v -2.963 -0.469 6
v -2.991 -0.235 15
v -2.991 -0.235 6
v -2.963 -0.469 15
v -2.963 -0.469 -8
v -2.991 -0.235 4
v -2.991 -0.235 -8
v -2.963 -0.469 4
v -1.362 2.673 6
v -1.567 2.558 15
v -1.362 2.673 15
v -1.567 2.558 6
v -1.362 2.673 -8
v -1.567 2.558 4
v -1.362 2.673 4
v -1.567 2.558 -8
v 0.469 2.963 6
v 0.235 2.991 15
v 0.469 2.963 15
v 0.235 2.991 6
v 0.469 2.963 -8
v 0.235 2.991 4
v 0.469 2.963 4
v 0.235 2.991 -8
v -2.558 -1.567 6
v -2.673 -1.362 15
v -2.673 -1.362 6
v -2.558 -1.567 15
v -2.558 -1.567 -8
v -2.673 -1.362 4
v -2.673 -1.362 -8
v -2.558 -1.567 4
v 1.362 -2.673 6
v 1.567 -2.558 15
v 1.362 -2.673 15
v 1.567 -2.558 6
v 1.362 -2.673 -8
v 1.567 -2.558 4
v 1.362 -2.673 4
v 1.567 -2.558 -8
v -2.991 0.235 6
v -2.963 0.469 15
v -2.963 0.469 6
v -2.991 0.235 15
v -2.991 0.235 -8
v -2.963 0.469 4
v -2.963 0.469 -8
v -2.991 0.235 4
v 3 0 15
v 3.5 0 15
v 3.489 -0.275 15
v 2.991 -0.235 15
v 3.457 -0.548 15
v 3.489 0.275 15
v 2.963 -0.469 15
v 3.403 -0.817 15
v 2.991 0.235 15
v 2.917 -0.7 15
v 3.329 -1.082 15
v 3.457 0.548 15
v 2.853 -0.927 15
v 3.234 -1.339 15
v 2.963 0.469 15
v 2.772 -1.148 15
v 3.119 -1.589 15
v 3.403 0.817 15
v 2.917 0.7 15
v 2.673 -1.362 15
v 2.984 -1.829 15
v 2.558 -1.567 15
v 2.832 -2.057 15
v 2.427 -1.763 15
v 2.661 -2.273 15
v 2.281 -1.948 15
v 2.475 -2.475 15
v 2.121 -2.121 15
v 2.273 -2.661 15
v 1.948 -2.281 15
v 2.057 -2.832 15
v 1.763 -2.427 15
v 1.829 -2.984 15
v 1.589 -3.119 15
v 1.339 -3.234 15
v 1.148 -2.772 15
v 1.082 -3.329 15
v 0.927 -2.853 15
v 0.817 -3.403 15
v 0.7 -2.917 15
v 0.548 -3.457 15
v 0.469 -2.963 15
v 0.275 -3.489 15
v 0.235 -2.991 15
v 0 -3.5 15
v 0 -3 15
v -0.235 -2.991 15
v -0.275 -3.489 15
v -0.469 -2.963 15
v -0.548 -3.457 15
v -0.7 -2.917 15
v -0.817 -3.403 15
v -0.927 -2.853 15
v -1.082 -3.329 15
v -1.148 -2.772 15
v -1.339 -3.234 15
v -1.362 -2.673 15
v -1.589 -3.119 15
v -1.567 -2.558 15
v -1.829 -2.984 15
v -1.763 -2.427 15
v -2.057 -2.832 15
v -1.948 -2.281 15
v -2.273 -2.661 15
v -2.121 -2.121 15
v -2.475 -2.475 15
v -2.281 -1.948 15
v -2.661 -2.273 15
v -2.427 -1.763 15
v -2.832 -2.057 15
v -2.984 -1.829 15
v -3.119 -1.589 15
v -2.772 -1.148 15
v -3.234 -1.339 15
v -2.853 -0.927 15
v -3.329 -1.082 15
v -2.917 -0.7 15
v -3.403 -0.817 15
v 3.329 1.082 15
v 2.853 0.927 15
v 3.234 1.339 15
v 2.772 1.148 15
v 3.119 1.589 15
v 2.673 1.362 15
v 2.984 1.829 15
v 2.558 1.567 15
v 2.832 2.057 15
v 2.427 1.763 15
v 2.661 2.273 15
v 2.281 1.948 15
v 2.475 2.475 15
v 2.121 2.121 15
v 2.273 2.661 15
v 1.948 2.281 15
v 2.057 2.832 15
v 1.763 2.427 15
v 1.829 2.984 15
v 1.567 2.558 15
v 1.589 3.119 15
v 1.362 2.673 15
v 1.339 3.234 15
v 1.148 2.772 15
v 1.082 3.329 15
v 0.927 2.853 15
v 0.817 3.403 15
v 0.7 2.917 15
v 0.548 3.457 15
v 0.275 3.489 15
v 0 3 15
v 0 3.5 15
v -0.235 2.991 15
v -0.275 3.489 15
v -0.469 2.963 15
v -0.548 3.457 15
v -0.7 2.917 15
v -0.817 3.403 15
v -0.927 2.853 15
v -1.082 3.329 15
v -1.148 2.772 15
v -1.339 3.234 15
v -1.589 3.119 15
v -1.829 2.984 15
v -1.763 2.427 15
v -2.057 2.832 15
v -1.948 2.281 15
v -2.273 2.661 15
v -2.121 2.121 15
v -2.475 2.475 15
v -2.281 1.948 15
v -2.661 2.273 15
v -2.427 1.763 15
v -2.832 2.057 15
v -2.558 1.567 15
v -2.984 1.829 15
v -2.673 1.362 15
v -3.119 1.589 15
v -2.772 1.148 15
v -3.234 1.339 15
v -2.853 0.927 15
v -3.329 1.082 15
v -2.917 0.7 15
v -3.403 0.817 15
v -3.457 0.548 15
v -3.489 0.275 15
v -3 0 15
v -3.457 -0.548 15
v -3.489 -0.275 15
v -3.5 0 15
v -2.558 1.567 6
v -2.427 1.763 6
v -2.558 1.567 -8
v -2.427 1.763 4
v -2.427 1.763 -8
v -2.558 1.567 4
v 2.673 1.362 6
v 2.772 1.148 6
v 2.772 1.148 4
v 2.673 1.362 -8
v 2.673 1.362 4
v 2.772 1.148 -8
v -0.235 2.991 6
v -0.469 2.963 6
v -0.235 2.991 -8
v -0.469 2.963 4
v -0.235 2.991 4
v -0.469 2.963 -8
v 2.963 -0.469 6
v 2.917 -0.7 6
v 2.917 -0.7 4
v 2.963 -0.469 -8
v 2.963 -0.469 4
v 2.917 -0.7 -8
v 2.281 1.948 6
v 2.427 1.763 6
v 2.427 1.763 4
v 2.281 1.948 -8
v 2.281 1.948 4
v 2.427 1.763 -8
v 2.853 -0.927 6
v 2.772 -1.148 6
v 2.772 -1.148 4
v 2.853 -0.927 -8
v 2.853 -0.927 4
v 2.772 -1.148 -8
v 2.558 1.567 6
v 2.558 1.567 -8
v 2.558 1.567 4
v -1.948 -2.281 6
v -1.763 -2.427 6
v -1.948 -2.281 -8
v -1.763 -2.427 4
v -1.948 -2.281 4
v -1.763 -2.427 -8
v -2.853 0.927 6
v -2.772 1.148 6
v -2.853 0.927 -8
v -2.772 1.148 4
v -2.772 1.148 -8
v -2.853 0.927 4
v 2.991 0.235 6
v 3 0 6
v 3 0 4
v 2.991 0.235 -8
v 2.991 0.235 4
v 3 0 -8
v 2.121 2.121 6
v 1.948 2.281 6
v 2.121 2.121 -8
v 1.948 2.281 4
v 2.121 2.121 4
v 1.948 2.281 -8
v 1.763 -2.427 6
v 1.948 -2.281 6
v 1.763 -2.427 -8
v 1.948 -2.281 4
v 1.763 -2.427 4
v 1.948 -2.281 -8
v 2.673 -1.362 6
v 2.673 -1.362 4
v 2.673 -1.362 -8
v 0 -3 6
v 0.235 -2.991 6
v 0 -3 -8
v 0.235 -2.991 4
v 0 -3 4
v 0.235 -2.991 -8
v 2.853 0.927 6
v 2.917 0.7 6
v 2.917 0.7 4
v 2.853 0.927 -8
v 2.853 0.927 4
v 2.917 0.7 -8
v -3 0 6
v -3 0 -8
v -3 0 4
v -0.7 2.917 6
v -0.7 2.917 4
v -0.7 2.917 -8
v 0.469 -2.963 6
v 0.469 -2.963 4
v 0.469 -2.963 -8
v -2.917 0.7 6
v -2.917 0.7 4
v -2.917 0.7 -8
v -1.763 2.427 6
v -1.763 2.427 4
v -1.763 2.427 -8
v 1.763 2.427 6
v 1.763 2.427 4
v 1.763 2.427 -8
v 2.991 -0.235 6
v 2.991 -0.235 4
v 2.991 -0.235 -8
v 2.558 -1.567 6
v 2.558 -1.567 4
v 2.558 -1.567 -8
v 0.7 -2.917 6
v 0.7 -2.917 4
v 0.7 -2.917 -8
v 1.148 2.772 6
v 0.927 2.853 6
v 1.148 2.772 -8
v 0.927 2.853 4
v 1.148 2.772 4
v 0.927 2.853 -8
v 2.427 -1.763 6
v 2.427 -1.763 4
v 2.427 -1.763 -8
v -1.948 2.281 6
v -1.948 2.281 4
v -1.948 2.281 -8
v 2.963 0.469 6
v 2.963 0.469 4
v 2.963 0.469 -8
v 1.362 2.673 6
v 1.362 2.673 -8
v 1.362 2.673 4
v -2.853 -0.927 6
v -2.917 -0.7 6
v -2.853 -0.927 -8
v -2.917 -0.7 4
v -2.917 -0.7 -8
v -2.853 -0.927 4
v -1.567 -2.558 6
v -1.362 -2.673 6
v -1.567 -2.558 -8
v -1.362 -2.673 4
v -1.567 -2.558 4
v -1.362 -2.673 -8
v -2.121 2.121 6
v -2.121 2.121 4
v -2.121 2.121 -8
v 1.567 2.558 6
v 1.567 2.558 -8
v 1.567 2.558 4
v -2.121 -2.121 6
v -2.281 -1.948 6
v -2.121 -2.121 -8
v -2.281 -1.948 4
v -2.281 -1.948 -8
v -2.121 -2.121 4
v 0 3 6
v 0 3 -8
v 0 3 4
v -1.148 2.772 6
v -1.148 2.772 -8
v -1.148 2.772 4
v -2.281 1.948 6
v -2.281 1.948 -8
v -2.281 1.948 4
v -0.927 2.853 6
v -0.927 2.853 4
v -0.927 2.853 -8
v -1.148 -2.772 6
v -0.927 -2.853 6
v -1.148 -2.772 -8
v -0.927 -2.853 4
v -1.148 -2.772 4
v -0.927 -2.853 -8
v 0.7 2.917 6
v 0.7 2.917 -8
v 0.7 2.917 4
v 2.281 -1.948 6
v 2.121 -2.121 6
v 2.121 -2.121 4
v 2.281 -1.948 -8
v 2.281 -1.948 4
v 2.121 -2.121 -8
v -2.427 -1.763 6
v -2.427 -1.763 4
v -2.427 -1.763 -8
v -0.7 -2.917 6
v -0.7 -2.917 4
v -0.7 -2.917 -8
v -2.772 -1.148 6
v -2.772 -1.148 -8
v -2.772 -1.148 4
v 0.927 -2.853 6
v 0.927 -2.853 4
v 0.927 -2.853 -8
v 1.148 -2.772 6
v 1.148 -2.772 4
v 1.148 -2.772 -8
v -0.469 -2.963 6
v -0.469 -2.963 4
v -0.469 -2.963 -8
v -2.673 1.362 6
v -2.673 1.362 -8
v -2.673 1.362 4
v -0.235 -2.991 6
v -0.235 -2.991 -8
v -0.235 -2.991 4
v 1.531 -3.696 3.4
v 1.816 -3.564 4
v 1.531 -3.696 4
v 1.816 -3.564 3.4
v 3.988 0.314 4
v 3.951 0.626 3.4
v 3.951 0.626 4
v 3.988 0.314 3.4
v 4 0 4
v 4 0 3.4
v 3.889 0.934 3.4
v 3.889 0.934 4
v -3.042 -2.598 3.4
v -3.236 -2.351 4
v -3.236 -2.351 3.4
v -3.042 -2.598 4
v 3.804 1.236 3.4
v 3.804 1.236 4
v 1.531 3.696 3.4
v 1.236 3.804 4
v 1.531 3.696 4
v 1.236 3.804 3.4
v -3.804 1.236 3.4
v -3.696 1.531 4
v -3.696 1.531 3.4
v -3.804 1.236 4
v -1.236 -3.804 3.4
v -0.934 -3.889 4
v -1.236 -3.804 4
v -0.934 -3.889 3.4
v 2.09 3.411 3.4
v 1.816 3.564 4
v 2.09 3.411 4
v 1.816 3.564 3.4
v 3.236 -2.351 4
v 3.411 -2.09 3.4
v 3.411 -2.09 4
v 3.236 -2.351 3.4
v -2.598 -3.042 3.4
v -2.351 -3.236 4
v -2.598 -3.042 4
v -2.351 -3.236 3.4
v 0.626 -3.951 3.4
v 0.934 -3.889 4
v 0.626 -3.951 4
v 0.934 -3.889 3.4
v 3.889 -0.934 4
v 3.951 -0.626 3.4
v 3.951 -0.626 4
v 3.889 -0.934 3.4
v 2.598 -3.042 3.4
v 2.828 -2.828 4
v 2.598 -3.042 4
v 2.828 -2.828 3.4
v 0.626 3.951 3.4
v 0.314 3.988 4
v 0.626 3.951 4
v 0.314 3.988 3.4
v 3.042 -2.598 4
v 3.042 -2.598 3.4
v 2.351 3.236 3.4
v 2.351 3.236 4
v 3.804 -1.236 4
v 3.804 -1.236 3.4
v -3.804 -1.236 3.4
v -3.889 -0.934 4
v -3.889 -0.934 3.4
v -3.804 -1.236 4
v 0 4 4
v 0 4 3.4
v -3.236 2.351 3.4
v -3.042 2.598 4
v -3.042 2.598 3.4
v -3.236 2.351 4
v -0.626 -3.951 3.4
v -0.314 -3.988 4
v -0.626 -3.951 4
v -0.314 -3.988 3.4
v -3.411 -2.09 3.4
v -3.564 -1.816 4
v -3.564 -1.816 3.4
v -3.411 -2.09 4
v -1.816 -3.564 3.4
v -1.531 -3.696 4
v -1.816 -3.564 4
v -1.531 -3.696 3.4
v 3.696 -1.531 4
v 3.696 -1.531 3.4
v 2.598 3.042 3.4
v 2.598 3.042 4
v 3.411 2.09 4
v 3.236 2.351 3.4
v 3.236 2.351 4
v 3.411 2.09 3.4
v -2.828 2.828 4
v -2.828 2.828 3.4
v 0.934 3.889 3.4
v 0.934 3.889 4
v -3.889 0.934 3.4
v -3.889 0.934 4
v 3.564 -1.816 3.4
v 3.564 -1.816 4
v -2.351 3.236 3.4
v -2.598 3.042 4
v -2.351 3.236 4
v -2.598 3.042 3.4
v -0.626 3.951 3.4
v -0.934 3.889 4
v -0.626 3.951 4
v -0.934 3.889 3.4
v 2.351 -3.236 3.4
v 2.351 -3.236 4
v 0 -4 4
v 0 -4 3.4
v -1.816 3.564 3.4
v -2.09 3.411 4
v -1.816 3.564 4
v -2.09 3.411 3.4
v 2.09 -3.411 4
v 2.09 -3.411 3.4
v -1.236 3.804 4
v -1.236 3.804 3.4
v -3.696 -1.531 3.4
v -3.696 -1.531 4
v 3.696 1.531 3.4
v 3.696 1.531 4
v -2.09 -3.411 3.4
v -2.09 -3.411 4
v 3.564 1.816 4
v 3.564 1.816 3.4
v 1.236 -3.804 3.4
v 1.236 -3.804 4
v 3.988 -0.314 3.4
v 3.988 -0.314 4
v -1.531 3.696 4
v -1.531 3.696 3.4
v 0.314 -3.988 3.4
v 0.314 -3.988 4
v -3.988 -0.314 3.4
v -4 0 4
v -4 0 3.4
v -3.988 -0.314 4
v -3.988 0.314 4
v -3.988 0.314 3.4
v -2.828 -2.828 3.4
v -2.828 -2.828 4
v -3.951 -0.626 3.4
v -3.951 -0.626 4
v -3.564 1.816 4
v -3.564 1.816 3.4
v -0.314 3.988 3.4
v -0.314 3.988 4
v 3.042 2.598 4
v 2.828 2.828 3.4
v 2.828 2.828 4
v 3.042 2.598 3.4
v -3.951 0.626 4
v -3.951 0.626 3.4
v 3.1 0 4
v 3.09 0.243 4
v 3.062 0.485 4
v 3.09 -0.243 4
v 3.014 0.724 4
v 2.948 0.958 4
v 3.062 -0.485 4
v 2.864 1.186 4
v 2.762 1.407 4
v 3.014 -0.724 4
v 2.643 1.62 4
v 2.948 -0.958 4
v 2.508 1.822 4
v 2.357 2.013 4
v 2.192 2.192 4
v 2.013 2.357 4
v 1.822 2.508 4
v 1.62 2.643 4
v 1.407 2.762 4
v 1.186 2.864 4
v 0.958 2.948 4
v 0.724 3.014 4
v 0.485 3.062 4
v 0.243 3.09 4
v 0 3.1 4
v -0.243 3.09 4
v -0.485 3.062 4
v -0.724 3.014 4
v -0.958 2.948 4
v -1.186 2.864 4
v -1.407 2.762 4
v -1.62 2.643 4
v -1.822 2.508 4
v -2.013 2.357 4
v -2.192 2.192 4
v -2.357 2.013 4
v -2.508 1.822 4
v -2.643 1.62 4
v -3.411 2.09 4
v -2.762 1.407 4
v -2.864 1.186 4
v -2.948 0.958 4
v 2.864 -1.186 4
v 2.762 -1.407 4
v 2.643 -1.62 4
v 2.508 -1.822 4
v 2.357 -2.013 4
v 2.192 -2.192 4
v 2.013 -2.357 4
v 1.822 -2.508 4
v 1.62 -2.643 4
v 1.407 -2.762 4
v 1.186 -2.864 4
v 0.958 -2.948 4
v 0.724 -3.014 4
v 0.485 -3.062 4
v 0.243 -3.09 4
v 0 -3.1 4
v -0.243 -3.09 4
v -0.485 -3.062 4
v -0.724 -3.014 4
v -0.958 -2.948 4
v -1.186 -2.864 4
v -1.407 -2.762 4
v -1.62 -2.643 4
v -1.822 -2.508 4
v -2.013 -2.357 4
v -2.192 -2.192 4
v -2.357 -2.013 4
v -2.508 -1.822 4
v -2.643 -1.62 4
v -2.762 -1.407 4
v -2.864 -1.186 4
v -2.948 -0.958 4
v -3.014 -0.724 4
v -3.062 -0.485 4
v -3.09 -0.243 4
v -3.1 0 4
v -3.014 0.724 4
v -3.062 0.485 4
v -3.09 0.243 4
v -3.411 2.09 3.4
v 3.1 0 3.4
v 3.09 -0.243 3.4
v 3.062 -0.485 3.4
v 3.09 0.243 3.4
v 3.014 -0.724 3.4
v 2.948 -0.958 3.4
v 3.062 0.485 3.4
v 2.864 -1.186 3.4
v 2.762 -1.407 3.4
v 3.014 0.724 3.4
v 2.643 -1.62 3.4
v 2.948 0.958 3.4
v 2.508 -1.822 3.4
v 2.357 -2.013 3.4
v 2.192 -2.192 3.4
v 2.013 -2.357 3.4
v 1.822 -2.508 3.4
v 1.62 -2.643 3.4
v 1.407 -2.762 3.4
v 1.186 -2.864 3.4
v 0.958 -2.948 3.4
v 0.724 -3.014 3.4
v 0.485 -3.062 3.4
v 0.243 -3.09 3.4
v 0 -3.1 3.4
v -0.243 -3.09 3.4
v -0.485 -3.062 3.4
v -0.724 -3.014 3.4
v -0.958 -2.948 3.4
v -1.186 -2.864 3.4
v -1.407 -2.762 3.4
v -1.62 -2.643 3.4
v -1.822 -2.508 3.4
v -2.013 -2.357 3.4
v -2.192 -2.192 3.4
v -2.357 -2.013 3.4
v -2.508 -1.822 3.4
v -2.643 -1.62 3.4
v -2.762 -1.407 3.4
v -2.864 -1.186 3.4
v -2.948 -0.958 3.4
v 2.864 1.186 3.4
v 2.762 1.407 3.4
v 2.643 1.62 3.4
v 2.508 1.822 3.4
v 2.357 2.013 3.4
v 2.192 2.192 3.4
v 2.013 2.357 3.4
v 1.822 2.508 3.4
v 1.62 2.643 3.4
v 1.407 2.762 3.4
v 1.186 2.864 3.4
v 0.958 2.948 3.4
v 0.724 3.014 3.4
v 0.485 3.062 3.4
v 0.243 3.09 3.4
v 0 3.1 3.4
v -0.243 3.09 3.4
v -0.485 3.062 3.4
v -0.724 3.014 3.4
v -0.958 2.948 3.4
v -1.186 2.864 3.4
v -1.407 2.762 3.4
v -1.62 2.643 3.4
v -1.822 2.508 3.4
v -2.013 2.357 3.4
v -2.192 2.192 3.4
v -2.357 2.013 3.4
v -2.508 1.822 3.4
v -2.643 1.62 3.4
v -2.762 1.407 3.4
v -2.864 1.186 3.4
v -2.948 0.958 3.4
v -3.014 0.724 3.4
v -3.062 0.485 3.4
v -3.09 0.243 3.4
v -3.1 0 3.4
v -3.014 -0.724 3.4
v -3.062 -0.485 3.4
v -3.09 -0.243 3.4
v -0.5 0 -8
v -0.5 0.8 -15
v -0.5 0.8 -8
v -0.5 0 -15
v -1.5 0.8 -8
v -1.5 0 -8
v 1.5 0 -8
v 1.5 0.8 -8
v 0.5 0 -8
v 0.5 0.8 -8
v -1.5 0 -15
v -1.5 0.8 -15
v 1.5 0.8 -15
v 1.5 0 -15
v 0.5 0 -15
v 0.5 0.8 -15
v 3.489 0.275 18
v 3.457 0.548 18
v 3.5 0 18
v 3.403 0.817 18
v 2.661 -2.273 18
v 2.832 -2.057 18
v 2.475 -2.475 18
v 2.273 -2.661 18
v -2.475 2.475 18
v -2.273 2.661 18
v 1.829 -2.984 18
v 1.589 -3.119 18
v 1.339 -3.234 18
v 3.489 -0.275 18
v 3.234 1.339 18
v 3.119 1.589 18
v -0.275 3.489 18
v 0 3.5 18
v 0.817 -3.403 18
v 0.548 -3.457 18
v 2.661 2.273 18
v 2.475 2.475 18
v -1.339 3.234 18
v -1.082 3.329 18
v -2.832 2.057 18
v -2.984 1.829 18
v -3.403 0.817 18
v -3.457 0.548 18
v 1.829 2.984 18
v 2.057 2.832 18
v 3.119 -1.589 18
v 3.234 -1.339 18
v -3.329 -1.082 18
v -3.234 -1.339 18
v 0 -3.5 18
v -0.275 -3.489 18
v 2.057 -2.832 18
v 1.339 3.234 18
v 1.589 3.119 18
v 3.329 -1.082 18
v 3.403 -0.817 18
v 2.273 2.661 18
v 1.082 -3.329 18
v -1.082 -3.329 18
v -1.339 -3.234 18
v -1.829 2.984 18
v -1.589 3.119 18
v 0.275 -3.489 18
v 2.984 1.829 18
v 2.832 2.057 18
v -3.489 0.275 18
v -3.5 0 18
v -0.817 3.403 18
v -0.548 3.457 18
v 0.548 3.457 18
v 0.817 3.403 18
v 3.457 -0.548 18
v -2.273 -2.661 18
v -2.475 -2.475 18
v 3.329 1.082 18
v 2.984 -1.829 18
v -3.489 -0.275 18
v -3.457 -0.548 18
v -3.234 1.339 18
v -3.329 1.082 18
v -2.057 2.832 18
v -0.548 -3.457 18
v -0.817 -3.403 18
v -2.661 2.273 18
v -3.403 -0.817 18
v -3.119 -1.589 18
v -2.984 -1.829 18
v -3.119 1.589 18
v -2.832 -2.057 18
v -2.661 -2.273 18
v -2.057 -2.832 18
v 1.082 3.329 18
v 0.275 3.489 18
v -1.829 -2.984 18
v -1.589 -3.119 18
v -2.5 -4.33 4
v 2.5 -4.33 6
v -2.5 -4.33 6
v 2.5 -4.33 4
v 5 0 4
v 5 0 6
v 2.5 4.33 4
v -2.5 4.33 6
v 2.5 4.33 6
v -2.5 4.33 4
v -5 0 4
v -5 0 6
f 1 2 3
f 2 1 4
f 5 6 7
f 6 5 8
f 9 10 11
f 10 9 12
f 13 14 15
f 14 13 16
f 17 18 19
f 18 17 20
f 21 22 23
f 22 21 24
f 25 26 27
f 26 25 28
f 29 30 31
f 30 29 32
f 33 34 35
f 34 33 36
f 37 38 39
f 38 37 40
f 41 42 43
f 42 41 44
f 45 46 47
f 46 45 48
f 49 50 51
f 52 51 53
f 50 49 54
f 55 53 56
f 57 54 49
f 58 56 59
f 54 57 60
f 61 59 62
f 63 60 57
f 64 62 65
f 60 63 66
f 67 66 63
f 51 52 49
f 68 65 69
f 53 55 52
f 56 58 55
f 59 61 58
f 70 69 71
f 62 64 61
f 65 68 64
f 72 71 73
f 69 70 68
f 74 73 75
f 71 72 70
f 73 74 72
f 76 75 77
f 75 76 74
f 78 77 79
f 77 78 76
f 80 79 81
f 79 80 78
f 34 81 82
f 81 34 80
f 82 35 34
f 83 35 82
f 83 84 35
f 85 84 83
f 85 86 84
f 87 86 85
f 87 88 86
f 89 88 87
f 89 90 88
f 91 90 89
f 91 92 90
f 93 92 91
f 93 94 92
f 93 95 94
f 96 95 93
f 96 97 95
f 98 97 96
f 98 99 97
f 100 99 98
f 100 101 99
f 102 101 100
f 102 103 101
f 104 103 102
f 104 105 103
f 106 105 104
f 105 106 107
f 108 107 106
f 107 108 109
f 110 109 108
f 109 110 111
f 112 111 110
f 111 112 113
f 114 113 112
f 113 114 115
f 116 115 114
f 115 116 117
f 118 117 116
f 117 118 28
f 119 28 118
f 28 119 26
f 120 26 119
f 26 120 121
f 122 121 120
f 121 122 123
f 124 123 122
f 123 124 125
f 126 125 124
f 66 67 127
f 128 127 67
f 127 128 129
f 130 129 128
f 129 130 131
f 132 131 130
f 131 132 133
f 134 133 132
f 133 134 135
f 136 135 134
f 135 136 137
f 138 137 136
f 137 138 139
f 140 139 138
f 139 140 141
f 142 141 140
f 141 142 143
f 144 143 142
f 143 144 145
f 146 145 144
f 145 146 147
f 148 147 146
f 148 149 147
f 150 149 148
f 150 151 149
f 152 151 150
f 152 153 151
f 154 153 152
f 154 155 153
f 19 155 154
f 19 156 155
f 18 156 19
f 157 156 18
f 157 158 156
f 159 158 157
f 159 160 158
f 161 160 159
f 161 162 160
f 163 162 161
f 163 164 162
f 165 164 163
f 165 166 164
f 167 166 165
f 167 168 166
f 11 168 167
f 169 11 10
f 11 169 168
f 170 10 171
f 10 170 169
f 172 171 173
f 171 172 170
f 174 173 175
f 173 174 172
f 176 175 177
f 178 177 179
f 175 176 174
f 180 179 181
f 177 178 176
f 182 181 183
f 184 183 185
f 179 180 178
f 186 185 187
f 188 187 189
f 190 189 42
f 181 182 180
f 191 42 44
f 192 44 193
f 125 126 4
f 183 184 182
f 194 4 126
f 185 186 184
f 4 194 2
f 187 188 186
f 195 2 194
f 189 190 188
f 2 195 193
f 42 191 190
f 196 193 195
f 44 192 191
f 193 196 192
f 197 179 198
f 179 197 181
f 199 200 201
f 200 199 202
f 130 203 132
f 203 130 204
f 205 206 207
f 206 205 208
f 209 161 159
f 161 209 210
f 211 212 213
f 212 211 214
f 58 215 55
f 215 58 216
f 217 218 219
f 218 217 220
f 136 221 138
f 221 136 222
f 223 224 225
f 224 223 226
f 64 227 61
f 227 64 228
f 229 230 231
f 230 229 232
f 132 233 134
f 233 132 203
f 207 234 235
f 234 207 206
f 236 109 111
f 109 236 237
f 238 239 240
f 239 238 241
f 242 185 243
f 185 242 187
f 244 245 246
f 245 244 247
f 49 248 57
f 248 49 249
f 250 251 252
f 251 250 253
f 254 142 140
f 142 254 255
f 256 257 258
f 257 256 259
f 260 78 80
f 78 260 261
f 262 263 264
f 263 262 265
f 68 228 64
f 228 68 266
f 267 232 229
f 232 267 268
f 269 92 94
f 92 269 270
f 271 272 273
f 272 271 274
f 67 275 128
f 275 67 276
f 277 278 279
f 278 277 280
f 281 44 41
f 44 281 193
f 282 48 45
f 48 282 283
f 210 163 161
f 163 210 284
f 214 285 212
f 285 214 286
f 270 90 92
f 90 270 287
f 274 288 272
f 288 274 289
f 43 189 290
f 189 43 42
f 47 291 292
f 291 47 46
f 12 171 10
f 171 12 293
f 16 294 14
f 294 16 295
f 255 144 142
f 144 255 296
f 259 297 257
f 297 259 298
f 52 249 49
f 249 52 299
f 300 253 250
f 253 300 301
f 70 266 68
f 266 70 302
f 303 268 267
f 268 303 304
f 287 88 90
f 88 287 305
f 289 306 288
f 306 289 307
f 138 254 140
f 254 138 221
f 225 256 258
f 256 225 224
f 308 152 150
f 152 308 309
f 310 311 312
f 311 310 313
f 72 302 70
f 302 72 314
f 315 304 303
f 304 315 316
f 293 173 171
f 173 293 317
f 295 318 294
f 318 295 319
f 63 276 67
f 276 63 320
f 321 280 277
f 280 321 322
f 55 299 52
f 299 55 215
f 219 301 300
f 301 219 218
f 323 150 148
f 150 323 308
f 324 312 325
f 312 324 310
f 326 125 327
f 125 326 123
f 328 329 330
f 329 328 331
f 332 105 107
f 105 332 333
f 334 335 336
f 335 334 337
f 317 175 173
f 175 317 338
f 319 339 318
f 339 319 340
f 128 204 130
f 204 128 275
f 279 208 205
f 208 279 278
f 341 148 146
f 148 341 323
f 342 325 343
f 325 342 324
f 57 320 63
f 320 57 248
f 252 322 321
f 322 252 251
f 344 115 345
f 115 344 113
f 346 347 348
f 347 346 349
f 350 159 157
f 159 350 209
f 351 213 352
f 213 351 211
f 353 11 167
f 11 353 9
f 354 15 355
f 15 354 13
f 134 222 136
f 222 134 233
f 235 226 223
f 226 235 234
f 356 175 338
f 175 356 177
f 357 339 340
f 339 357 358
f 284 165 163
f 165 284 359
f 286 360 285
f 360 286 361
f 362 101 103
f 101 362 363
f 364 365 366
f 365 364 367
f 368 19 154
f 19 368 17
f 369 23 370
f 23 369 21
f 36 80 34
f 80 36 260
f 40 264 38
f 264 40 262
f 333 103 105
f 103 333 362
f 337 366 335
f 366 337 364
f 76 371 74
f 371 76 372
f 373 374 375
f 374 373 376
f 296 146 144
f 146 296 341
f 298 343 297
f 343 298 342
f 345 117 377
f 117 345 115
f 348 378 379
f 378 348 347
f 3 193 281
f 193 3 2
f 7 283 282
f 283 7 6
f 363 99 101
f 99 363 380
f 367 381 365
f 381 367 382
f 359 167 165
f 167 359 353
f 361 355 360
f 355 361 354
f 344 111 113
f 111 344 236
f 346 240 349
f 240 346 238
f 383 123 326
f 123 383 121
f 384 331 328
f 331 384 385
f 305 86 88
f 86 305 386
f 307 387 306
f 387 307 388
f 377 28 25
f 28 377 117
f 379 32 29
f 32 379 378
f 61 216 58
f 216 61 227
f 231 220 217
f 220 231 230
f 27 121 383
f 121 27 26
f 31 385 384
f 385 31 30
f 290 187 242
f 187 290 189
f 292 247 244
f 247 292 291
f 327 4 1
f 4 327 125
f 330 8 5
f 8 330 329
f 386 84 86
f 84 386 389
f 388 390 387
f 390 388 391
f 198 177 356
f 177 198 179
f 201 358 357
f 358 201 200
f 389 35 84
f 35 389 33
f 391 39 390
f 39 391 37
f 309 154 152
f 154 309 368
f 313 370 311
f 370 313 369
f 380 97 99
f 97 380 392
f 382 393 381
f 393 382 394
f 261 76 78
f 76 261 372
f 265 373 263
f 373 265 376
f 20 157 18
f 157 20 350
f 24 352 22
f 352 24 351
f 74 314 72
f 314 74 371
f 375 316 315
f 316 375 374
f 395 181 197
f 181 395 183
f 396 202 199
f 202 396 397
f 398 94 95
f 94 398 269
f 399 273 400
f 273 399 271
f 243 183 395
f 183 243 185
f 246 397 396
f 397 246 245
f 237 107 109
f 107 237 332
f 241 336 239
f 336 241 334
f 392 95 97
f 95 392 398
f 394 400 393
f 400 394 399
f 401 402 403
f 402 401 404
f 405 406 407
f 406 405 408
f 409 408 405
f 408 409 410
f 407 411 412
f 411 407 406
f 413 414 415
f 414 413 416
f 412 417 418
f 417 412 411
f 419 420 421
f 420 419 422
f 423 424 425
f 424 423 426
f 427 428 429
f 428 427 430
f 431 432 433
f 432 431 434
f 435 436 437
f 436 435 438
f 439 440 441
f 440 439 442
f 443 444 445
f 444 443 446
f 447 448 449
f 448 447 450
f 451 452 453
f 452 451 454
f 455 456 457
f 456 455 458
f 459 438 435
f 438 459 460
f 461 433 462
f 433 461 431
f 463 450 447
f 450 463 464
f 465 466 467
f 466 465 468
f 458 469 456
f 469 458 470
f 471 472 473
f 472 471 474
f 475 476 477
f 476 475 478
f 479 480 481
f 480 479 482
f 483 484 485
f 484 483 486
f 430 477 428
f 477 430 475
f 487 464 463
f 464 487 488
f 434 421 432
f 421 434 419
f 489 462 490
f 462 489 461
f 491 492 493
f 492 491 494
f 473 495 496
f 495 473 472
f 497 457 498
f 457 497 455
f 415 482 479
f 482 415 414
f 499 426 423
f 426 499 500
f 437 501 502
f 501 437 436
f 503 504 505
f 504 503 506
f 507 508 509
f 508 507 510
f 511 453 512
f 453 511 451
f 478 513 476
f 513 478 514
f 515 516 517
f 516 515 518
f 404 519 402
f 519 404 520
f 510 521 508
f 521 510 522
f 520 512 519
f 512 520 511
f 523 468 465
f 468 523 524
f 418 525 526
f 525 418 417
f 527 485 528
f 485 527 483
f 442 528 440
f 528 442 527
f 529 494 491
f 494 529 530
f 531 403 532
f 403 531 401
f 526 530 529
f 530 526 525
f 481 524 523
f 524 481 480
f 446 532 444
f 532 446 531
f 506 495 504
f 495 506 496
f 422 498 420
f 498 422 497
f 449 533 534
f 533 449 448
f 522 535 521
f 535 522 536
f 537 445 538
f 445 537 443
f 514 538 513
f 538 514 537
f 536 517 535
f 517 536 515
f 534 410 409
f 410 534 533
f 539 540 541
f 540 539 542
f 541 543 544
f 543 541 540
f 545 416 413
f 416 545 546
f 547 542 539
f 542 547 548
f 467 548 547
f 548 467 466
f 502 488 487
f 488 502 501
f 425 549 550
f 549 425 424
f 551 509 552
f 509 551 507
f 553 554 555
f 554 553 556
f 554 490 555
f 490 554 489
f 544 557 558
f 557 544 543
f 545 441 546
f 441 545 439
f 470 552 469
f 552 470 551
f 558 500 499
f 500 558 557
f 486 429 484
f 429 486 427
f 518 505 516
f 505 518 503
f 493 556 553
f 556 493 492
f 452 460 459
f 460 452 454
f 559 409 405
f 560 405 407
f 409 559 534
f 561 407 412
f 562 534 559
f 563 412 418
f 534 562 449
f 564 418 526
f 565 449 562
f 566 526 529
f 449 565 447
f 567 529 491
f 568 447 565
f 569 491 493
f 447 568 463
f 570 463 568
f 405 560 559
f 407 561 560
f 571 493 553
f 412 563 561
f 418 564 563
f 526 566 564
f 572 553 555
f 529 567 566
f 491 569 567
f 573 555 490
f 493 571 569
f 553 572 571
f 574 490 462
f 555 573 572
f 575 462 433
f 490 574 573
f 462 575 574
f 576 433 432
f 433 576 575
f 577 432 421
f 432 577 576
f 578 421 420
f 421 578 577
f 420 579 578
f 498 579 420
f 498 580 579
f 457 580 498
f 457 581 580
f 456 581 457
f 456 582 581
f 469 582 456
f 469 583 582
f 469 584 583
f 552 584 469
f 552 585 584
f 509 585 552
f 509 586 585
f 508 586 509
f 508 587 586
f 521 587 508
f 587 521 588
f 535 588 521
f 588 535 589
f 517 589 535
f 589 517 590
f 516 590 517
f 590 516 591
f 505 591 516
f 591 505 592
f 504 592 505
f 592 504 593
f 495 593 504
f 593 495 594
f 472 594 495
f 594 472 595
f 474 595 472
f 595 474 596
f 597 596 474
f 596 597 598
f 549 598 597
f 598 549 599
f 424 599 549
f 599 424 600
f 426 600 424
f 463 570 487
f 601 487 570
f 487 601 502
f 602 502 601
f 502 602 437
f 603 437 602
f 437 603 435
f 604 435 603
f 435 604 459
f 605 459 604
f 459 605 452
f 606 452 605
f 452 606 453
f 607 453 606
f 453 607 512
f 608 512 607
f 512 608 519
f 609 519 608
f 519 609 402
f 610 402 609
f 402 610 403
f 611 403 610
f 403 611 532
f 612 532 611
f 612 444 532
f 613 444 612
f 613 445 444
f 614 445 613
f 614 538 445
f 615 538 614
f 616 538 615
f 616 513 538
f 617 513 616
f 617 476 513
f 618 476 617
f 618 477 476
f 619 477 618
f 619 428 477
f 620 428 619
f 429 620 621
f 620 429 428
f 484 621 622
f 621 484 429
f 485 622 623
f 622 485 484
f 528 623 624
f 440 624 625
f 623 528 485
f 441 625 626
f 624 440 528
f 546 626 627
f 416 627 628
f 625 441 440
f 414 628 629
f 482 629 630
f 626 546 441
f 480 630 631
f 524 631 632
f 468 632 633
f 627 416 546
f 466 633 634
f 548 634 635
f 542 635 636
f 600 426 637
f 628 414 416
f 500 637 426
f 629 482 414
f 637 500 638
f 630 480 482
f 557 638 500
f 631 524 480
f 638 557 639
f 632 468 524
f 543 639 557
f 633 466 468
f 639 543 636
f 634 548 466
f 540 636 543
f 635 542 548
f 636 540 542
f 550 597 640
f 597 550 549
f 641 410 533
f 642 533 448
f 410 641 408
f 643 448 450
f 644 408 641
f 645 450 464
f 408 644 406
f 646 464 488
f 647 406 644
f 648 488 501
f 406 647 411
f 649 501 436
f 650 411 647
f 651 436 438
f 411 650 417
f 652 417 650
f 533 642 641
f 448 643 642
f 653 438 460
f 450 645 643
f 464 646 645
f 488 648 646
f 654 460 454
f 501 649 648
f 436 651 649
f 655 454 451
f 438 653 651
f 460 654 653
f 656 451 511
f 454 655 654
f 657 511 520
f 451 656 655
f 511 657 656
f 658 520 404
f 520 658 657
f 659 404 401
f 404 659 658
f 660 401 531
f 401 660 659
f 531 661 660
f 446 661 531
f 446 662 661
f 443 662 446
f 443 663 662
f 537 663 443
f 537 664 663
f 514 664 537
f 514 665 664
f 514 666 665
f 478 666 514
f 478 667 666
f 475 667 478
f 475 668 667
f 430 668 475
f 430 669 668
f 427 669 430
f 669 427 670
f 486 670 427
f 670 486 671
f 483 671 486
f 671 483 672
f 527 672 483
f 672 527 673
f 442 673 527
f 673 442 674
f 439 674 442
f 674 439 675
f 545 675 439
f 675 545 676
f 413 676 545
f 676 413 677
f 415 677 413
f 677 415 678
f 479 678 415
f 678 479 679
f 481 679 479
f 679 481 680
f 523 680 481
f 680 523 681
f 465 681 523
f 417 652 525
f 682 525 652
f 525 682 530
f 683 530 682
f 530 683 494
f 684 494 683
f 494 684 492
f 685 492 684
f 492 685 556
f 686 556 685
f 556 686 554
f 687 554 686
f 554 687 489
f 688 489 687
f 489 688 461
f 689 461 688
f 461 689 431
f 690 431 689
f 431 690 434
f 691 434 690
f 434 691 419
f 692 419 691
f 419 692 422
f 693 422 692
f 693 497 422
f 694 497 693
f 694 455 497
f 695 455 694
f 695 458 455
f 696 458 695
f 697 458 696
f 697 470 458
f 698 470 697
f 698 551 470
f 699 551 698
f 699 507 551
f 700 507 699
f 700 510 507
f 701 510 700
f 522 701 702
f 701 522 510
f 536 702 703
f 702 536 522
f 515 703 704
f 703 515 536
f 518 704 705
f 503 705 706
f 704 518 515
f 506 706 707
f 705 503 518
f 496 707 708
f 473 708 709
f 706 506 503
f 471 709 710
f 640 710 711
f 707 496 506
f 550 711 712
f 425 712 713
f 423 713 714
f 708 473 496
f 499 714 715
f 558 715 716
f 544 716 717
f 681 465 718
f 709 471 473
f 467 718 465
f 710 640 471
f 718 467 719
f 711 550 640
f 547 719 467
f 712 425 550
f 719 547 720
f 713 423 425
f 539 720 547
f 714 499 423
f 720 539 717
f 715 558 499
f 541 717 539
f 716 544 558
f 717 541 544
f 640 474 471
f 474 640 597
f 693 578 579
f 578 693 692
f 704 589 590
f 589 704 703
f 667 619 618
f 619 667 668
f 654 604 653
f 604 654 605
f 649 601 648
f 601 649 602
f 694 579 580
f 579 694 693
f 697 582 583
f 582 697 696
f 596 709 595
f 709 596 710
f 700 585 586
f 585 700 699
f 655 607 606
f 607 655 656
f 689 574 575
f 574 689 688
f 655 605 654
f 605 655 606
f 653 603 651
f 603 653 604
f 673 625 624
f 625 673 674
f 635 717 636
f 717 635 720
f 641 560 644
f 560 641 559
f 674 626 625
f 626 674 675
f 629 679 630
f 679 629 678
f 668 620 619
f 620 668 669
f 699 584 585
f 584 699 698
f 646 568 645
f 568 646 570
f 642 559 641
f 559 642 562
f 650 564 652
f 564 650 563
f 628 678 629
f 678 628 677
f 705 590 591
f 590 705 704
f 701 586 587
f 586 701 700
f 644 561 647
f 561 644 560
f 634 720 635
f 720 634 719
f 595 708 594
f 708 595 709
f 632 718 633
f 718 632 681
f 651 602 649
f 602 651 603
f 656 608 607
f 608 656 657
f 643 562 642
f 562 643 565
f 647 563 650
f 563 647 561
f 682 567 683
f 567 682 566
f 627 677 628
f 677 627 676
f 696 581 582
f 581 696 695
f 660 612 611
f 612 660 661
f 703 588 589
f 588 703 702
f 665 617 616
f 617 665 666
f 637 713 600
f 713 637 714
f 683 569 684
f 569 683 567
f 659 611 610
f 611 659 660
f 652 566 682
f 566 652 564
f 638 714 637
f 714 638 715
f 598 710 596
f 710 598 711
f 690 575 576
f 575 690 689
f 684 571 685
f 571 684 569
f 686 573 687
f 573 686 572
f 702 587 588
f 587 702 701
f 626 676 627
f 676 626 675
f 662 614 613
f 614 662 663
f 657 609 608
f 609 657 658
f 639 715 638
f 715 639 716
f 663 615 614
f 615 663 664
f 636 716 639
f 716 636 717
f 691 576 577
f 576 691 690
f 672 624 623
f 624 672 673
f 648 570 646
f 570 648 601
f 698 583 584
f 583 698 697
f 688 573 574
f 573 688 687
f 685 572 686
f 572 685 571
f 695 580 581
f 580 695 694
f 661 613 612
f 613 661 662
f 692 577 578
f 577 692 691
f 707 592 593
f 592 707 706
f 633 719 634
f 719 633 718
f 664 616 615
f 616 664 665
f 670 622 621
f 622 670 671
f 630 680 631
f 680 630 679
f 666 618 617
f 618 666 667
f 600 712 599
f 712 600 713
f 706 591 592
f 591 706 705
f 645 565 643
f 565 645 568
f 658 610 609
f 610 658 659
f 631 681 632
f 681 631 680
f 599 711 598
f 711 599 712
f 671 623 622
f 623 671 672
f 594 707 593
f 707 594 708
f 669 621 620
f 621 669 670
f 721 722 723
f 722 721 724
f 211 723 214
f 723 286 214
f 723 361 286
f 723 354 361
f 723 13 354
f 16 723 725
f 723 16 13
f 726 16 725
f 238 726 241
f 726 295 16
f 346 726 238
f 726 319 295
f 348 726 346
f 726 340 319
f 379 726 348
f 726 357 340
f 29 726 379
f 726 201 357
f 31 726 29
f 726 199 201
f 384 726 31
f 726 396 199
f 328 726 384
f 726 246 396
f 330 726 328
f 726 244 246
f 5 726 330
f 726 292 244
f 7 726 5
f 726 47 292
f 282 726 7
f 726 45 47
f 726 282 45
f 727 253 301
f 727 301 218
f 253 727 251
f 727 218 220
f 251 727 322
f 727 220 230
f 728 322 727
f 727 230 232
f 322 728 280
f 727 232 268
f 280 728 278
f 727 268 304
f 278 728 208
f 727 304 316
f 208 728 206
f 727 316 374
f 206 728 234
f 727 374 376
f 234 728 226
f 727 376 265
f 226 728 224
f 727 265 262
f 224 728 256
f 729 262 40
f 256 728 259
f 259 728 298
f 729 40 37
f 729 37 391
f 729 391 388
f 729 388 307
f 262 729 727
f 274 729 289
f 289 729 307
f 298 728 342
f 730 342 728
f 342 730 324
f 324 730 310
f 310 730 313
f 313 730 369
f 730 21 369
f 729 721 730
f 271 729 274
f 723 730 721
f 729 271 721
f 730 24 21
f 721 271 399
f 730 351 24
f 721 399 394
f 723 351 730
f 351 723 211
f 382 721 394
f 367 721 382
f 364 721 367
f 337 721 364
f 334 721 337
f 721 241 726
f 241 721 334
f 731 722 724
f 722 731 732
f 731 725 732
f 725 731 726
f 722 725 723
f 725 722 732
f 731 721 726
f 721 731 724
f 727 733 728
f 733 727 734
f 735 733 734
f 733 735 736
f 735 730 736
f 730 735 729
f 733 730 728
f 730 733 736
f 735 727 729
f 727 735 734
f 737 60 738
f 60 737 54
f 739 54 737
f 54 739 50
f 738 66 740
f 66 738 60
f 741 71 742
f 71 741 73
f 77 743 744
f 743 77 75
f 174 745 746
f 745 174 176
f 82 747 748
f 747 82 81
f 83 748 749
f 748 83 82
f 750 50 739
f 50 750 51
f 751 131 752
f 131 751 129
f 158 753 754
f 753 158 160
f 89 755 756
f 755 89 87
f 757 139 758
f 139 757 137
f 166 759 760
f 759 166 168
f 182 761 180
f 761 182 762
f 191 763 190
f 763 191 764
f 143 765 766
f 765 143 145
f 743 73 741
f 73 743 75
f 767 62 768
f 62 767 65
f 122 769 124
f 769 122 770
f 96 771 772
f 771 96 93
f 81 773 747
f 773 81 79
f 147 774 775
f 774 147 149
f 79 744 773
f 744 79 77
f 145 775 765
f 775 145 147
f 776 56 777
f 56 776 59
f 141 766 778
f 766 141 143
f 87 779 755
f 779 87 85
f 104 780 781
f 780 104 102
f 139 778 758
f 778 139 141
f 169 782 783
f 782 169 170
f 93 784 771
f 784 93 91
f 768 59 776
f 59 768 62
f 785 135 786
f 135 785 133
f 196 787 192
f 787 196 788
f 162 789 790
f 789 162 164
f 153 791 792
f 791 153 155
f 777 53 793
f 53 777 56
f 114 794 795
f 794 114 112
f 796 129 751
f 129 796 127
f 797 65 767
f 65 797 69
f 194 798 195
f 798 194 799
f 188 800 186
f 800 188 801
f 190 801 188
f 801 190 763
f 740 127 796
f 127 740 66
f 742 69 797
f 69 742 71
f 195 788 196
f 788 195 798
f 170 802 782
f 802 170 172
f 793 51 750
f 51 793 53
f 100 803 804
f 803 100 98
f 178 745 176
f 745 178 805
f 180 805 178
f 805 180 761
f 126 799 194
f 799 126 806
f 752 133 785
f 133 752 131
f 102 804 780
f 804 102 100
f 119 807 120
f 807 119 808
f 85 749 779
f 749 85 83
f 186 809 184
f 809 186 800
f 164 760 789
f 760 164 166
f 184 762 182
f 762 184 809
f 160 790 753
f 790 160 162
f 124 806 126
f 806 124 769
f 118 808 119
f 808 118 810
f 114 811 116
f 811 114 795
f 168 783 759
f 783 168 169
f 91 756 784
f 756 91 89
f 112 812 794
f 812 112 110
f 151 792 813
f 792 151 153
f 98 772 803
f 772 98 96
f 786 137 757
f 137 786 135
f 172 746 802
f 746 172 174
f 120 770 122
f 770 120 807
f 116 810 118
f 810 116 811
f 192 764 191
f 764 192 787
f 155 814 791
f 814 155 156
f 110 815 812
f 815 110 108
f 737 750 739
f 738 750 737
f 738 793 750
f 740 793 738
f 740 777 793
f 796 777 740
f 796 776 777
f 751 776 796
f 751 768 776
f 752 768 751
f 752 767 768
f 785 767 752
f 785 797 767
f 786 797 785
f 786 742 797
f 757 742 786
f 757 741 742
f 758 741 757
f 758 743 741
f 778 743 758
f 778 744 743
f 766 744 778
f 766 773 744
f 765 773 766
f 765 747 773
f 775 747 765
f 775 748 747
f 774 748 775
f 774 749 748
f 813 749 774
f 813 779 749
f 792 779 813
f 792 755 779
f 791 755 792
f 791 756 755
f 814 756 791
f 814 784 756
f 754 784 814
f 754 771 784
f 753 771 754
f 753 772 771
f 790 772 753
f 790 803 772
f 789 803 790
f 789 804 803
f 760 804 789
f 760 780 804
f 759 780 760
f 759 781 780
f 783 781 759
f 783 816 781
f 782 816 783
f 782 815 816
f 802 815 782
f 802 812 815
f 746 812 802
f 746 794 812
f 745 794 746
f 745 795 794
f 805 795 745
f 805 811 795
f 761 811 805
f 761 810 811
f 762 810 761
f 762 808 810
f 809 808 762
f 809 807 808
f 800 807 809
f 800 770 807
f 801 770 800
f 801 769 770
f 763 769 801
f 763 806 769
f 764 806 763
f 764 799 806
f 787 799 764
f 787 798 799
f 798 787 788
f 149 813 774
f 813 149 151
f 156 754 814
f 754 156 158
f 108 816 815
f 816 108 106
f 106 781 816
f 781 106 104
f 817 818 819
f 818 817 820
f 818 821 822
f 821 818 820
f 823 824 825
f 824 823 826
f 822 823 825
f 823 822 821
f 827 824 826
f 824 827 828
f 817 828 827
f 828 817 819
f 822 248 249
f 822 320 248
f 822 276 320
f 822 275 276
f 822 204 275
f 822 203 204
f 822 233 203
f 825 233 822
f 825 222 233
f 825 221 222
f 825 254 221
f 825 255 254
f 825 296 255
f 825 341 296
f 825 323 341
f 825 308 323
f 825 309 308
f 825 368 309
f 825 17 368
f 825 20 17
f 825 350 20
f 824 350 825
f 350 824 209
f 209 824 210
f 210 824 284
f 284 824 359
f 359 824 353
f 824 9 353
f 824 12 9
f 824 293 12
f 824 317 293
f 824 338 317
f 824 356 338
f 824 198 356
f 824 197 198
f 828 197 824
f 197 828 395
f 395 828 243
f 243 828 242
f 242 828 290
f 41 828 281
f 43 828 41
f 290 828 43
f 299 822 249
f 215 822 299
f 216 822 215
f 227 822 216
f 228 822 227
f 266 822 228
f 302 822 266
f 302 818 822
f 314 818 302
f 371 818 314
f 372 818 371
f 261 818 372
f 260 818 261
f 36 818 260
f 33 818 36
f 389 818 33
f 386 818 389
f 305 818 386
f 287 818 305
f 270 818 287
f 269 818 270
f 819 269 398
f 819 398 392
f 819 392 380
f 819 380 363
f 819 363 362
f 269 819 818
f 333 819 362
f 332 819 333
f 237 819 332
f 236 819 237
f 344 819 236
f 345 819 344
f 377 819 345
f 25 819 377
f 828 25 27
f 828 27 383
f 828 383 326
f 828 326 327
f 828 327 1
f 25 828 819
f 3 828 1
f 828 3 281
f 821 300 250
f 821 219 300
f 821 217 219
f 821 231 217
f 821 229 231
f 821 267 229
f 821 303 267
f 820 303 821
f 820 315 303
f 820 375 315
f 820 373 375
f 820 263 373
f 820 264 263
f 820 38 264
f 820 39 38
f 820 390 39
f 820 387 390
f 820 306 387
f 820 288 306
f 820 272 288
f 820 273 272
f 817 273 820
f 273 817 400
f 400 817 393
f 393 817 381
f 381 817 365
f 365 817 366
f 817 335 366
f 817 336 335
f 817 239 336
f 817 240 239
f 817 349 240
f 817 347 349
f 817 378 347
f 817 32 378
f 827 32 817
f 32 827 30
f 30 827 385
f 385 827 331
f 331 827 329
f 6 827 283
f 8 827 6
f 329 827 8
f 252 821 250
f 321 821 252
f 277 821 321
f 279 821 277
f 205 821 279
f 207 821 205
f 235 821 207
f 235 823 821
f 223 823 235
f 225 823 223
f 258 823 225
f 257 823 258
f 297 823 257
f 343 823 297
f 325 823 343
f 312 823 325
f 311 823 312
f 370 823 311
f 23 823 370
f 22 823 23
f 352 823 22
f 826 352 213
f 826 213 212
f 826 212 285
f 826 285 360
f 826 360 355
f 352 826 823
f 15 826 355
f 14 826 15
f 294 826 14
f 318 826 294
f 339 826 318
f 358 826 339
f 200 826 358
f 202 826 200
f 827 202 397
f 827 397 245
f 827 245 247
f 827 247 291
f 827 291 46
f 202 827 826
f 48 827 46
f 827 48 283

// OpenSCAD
// Pulsador momentáneo NC - modelo aproximado basado en fotografías
$fn=80;

module button(){
    color("red")
    translate([0,0,15])
        cylinder(h=3,d=7);
}

module body(){
    color("silver"){
        cylinder(h=15,d=6);
        translate([0,0,4])
            cylinder(h=7,d=6.0);
    }
}

module nut(){
    color("silver")
    translate([0,0,4])
        cylinder(h=2,d=10,$fn=6);
}

module washer(){
    color("silver")
    translate([0,0,3.4])
    difference(){
        cylinder(h=0.6,d=8);
        cylinder(h=0.7,d=6.2);
    }
}

module insulator(){
    color("black")
    translate([0,0,-8])
        cylinder(h=8,d=6);
}

module terminals(){
    color("gold"){
        translate([-1.5,0,-15])
            cube([1,0.8,7]);
        translate([0.5,0,-15])
            cube([1,0.8,7]);
    }
}

body();
button();
washer();
nut();
insulator();
terminals();
